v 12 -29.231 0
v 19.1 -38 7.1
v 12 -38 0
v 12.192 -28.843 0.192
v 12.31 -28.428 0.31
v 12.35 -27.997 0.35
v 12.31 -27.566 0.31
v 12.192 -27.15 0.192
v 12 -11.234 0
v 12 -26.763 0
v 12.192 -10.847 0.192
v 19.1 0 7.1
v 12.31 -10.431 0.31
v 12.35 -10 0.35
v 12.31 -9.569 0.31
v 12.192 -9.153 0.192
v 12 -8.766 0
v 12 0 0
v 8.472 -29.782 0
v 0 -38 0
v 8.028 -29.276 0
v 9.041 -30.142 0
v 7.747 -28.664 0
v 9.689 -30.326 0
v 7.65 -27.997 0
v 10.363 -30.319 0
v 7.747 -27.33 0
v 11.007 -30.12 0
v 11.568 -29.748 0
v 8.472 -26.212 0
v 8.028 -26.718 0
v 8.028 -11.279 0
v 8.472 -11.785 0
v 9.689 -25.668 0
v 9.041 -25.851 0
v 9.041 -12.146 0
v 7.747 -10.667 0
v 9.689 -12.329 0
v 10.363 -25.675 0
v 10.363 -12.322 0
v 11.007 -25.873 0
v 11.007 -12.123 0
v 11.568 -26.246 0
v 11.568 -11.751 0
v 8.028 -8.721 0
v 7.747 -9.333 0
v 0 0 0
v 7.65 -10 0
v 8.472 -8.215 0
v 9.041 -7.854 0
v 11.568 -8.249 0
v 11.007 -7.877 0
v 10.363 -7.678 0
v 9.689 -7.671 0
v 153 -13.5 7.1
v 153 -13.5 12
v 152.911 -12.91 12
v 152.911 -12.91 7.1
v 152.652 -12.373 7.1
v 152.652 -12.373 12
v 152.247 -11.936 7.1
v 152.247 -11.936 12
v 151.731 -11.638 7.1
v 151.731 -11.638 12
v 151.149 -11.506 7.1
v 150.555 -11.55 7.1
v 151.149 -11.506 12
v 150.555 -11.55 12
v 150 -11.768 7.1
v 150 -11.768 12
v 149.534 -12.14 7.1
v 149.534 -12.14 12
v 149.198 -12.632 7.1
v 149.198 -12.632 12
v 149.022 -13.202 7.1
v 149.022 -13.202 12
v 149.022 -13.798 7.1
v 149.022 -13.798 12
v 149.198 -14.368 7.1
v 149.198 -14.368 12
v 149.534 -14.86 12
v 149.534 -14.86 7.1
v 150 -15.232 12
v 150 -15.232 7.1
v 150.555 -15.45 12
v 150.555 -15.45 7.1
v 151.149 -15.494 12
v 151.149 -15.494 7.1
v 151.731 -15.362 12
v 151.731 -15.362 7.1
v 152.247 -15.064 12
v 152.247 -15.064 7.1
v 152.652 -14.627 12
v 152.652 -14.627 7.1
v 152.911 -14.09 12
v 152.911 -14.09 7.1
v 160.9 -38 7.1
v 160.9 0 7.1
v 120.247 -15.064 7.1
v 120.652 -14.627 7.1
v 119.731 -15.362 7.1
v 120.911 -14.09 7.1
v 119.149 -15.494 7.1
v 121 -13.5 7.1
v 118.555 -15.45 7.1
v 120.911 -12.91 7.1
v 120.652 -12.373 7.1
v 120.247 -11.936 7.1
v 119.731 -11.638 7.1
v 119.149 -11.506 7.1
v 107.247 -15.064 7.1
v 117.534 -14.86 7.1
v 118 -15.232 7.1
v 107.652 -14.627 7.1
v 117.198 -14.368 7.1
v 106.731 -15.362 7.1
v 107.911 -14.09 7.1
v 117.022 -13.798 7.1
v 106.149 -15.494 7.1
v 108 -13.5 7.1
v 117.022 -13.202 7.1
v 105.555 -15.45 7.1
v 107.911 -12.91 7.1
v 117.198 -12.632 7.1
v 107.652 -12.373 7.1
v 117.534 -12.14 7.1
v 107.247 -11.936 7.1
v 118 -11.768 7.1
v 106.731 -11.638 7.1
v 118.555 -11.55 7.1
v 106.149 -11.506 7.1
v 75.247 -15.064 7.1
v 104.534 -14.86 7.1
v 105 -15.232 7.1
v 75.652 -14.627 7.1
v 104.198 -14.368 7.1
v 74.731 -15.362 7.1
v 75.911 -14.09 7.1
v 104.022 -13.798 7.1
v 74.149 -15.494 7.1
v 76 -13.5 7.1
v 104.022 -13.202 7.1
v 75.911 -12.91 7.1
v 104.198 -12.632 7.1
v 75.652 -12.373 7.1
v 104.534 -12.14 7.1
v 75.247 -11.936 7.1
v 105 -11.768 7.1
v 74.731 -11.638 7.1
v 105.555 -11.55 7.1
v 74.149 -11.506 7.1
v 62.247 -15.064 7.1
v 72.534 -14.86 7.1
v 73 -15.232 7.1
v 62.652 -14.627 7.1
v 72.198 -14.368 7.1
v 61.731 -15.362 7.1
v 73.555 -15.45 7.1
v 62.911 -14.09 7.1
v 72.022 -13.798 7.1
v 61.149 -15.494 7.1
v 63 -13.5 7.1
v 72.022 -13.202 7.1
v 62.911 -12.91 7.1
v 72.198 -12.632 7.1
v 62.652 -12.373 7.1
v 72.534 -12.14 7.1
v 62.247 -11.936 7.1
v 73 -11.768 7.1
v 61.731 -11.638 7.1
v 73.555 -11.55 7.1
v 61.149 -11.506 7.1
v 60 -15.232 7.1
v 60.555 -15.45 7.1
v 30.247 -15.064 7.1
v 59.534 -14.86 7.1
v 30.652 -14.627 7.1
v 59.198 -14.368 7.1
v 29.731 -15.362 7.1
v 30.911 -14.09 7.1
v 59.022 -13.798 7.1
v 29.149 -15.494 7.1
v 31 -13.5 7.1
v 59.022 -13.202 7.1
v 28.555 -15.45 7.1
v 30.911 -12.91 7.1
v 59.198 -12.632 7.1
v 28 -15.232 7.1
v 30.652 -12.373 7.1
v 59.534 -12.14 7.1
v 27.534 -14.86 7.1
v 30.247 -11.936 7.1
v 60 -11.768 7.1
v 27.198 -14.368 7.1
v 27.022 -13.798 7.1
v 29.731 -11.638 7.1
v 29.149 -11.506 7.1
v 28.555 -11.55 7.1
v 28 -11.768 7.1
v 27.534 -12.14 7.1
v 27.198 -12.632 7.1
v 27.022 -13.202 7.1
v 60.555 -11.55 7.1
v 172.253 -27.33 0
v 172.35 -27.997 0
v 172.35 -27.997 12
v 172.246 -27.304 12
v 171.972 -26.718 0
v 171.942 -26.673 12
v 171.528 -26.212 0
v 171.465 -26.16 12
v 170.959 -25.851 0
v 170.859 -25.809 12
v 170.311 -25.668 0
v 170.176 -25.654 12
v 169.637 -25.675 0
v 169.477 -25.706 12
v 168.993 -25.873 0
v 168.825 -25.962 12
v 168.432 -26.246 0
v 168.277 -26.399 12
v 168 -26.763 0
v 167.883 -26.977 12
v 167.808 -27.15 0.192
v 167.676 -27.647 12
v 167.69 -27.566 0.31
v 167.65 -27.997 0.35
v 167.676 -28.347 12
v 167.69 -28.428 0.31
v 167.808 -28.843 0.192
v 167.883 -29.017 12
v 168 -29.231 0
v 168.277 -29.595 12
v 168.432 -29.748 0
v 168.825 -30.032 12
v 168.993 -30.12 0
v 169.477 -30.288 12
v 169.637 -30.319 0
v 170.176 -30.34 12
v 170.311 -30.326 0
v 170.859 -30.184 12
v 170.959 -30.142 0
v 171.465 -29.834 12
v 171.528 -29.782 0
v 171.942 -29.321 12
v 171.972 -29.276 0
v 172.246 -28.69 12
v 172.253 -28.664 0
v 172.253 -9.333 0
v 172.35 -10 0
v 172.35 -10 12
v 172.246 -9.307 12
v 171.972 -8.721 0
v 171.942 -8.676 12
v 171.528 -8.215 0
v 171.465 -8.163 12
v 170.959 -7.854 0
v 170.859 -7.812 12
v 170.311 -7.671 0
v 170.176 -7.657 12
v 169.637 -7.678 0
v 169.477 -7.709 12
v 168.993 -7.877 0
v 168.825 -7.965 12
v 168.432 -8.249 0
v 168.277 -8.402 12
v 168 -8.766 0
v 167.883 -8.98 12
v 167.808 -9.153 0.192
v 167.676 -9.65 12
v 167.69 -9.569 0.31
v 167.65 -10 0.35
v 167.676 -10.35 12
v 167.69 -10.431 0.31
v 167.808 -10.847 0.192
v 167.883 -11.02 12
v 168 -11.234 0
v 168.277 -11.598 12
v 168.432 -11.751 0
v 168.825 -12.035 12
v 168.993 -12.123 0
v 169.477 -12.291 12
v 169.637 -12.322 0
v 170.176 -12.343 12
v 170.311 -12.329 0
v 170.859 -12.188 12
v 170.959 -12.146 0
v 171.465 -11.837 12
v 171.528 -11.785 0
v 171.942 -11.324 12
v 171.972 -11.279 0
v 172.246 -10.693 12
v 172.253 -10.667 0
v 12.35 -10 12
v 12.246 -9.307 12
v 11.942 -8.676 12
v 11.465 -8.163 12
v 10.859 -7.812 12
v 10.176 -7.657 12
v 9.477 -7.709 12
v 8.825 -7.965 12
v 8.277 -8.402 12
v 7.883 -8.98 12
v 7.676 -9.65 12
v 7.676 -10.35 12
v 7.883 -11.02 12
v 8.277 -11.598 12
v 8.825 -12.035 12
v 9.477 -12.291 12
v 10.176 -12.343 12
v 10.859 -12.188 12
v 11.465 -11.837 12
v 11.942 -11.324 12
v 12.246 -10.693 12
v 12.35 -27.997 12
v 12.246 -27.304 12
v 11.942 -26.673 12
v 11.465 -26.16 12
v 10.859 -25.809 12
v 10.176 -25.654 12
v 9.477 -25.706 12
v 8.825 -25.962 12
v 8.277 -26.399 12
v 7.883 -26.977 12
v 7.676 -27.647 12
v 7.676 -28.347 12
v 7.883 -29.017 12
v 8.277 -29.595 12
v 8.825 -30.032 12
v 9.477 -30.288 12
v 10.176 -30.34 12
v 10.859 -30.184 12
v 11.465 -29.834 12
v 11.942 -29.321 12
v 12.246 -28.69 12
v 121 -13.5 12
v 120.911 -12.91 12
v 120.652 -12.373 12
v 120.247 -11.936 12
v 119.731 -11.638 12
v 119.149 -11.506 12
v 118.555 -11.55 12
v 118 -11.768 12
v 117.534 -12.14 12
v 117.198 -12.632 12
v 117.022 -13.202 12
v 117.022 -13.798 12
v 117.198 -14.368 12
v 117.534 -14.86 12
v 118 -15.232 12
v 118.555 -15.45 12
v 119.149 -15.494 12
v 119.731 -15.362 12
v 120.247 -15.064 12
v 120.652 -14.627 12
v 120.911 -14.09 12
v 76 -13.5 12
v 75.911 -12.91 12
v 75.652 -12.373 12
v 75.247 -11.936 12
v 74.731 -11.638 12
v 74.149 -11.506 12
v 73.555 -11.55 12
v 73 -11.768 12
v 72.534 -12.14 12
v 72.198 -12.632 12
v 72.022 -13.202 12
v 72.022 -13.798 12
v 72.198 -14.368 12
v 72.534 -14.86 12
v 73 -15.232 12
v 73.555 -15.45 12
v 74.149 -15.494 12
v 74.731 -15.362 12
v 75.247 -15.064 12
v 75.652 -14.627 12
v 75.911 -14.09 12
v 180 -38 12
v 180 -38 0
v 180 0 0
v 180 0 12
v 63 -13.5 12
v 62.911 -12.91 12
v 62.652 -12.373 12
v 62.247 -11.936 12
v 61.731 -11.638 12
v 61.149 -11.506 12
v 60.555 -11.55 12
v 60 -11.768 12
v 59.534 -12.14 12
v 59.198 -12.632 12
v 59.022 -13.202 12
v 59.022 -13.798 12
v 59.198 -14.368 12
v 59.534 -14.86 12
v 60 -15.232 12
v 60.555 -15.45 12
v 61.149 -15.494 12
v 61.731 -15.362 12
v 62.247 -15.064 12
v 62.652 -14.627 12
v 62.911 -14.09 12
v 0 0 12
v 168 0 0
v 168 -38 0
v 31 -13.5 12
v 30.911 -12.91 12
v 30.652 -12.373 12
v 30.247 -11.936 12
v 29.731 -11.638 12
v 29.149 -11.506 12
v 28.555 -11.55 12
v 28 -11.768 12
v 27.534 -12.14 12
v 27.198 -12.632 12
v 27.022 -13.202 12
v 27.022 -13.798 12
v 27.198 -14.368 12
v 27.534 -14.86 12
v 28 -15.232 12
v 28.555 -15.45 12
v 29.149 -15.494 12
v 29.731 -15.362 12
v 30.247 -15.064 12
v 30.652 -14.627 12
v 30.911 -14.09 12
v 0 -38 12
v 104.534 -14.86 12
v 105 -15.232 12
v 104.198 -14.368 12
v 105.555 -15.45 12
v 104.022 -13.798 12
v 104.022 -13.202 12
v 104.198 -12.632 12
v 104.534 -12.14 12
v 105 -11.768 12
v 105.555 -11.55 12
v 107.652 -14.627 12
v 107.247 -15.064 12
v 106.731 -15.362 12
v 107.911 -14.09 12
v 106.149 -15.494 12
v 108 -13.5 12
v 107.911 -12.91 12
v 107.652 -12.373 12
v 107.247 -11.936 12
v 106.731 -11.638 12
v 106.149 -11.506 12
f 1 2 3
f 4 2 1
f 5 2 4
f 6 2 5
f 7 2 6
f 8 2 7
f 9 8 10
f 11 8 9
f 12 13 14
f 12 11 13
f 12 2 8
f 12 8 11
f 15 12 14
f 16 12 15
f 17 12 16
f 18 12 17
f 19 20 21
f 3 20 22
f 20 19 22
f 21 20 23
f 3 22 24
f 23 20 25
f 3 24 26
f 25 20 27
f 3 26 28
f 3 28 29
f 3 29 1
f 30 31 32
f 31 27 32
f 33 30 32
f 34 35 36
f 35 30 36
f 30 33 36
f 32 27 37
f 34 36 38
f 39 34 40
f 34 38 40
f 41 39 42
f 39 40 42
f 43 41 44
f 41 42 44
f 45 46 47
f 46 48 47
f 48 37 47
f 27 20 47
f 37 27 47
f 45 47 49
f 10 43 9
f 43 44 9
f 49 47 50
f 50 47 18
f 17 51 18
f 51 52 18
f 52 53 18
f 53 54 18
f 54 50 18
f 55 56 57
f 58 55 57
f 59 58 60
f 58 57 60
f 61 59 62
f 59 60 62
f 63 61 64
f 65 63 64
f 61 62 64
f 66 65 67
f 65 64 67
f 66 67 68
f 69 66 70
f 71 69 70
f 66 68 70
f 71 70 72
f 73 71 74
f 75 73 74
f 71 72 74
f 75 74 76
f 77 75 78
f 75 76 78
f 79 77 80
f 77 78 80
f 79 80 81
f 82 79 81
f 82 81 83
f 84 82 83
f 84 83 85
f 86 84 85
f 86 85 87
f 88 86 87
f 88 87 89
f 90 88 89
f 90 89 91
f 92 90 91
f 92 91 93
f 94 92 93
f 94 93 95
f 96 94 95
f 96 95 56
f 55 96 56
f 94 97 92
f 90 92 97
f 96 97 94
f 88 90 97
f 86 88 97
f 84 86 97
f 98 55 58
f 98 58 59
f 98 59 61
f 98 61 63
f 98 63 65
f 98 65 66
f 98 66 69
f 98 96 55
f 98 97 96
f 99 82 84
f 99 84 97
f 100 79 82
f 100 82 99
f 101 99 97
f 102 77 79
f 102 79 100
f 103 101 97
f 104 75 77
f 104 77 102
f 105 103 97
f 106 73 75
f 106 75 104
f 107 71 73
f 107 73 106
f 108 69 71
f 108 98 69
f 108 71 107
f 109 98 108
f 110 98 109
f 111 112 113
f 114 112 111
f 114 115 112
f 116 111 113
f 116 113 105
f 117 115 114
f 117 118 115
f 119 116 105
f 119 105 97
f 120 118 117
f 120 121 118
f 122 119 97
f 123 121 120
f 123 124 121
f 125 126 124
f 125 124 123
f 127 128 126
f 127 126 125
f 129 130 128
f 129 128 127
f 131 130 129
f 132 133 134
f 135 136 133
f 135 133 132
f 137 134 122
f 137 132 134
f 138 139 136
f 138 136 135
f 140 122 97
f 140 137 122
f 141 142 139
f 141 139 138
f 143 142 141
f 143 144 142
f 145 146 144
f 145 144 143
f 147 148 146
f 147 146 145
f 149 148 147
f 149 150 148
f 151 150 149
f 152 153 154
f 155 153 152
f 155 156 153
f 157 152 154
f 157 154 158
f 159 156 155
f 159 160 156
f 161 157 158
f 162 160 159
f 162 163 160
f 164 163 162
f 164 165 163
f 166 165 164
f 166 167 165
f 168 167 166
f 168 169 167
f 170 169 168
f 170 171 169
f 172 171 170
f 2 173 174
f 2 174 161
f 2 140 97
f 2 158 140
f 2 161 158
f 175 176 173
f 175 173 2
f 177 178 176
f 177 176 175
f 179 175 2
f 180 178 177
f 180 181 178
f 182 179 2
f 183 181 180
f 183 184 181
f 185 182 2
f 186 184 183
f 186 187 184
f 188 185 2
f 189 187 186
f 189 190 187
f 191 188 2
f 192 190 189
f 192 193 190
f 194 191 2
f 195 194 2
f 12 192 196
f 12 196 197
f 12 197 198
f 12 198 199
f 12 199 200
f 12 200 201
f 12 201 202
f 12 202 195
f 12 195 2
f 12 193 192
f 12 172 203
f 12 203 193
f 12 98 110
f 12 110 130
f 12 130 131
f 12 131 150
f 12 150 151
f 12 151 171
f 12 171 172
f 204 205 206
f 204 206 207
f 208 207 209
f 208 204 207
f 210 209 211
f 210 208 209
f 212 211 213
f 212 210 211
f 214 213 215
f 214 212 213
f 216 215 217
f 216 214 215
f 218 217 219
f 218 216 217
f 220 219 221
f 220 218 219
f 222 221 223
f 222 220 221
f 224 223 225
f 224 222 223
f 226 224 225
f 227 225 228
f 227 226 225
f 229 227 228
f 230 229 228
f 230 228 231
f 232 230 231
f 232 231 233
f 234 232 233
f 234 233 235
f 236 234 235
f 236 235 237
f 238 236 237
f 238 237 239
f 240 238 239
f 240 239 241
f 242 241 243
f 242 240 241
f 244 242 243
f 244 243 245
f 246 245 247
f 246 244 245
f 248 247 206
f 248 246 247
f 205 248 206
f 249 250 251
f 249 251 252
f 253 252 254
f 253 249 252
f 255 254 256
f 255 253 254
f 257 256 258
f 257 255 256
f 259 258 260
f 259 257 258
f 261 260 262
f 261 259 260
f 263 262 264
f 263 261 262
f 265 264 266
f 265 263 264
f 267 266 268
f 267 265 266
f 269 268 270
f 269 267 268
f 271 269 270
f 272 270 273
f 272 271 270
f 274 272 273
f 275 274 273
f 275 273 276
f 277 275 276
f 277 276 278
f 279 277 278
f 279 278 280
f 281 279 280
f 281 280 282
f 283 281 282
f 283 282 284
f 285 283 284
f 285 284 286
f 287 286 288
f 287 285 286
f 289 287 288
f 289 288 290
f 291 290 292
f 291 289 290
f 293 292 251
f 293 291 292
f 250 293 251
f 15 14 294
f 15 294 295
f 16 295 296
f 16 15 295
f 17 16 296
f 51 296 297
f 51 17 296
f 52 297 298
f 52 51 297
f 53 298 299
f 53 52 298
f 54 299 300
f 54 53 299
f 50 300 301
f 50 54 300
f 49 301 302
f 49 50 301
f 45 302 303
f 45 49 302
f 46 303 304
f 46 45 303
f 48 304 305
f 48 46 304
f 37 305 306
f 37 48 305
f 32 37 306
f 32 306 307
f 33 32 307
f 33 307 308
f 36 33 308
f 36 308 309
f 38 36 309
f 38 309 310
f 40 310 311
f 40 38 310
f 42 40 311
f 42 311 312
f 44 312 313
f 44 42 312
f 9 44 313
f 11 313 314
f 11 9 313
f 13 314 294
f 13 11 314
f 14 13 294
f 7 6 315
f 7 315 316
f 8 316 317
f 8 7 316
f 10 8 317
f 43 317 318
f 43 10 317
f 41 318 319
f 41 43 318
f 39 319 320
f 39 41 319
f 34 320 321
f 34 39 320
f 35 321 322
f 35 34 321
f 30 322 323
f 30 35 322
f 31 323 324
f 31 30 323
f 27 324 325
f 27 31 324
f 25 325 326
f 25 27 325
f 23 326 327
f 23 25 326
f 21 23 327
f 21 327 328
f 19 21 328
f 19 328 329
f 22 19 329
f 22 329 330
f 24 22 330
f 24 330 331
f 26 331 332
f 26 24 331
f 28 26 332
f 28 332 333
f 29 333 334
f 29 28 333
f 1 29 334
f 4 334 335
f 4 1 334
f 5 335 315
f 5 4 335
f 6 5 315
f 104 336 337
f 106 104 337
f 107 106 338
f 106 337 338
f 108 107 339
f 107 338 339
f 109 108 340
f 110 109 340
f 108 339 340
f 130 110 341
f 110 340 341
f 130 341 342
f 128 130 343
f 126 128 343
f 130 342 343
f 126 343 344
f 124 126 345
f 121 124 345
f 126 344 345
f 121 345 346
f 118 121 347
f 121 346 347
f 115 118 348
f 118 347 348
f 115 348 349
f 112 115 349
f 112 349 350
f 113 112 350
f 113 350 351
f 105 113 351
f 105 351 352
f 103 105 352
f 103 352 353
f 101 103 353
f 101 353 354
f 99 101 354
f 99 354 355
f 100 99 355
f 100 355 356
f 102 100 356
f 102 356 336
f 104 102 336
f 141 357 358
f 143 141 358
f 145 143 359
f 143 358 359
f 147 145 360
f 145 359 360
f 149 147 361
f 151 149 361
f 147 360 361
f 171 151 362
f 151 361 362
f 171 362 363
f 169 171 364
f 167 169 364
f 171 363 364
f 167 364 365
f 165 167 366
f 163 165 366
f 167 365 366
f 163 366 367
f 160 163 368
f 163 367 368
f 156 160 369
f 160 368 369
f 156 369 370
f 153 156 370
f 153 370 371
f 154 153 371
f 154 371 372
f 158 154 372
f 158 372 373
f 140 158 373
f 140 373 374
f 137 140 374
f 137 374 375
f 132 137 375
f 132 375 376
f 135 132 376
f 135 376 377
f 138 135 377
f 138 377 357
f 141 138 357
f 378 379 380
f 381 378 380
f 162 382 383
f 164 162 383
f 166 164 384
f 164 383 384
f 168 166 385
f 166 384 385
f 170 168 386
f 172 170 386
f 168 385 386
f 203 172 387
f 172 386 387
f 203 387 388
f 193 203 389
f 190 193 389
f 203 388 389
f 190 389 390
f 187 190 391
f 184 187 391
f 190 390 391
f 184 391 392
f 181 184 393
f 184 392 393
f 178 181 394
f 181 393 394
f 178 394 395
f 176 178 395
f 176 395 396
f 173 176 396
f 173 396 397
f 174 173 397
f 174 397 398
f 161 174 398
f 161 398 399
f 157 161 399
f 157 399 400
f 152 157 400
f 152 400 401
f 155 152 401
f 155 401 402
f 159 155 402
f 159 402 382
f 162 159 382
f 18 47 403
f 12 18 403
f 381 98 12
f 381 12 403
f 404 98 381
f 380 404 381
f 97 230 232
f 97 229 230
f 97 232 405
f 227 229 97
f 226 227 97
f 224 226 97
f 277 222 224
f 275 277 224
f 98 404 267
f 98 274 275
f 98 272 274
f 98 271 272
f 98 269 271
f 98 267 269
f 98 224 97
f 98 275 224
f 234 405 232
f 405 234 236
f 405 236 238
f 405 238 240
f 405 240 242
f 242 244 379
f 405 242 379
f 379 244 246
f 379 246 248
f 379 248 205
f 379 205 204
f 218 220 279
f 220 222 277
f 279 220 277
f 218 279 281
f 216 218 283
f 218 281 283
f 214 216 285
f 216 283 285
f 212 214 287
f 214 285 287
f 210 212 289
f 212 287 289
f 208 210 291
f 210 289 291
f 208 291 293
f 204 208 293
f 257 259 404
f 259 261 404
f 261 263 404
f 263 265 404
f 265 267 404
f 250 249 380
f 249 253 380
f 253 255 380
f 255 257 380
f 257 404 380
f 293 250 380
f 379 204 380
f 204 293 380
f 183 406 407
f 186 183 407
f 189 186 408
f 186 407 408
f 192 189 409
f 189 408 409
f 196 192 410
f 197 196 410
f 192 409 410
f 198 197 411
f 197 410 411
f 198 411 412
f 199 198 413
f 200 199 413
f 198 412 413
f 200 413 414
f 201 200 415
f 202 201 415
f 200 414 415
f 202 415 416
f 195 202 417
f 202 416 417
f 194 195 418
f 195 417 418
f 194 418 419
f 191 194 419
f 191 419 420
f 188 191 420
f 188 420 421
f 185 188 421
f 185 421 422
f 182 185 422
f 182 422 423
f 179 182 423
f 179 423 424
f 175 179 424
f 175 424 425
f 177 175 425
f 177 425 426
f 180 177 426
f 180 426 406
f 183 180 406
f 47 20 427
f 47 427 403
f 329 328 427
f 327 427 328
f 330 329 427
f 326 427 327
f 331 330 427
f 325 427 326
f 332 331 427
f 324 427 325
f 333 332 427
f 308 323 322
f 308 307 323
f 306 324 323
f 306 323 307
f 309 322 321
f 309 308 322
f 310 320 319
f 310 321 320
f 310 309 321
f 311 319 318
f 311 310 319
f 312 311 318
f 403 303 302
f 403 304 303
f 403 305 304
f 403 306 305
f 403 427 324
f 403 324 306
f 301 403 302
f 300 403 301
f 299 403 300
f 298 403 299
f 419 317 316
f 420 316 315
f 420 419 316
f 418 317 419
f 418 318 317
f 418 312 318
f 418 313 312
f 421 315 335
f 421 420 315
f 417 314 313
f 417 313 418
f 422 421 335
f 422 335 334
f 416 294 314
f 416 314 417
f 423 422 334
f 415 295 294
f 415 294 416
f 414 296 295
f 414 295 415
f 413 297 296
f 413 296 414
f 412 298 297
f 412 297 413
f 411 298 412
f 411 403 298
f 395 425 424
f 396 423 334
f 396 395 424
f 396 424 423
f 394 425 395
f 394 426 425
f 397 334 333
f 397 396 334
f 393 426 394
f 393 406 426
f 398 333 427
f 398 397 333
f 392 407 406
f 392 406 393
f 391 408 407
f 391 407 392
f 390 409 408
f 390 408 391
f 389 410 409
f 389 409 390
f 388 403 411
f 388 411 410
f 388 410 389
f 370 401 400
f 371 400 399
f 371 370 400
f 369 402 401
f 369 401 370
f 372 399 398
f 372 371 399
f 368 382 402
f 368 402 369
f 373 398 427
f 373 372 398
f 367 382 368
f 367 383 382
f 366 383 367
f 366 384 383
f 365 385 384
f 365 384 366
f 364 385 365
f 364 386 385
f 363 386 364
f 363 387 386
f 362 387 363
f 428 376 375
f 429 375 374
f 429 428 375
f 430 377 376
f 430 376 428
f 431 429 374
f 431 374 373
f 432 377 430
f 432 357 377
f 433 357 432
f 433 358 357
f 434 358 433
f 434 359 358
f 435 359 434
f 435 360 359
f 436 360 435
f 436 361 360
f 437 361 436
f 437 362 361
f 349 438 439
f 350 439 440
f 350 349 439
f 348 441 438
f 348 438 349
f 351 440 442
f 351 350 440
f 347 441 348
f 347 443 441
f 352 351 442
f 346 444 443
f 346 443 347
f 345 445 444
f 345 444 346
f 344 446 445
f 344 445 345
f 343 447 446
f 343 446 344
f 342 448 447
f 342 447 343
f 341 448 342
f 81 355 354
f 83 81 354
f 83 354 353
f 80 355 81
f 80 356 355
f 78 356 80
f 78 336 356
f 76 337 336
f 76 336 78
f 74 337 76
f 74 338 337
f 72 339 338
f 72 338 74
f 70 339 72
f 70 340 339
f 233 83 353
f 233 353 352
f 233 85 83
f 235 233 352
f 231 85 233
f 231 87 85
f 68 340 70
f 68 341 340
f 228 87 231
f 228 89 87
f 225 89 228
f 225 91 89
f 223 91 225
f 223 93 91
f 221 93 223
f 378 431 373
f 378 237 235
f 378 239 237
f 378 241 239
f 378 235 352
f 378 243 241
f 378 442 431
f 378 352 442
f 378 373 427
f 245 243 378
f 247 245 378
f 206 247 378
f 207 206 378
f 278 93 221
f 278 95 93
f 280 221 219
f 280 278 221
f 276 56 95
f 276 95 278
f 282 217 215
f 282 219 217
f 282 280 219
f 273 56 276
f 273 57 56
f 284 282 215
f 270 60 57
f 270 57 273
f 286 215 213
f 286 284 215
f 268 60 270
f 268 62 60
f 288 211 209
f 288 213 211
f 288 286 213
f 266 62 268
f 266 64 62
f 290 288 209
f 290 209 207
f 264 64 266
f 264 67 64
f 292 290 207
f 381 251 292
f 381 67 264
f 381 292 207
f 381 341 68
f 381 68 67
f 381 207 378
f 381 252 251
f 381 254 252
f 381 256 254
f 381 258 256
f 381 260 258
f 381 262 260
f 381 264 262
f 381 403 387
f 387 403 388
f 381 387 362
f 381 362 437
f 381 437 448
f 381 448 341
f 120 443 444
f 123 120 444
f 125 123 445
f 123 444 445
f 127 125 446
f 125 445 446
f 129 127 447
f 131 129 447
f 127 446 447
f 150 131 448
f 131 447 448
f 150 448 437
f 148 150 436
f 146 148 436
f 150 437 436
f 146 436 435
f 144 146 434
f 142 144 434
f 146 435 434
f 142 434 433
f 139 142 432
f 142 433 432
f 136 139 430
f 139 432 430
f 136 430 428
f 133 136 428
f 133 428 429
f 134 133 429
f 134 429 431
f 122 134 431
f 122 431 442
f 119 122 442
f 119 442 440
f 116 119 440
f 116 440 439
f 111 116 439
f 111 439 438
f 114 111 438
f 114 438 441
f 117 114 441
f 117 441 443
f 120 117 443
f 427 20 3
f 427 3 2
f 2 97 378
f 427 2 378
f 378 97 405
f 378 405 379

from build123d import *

# Parameters (mm, degrees)
SKETCH1_W           = 180
SKETCH1_H           = 38
SKETCH1_R           = 2.35
BOSS_EXTRUDE1_DEPTH = 12
CUT_EXTRUDE1_DEPTH  = 38
SKETCH3_R           = 2
CUT_EXTRUDE2_DEPTH  = 22


with BuildPart() as part:
    # Sketch1 → Boss-Extrude1 (new body)
    with BuildSketch(Plane.XY):
        with Locations((90, -19)):
            Rectangle(SKETCH1_W, SKETCH1_H)
        with Locations((170, -10)):
            Circle(SKETCH1_R, mode=Mode.SUBTRACT)
        with Locations((170, -27.996930787)):
            Circle(SKETCH1_R, mode=Mode.SUBTRACT)
        with Locations((10, -10)):
            Circle(SKETCH1_R, mode=Mode.SUBTRACT)
        with Locations((10, -27.996930787)):
            Circle(SKETCH1_R, mode=Mode.SUBTRACT)
    extrude(amount=BOSS_EXTRUDE1_DEPTH)

    # Sketch2 → Cut-Extrude1 (cut)
    with BuildSketch(Plane(origin=(0, 0, 0), x_dir=(1, 0, 0), z_dir=(0, 1, 0))):
        Polygon((168, 0), (160.9, -7.1), (19.1, -7.1), (12, 0), align=None)
    extrude(amount=-CUT_EXTRUDE1_DEPTH, mode=Mode.SUBTRACT)

    # Sketch3 → Cut-Extrude2 (cut)
    with BuildSketch(Plane.XY.offset(12)):
        with Locations((151, -13.5)):
            Circle(SKETCH3_R)
        with Locations((119, -13.5)):
            Circle(SKETCH3_R)
        with Locations((106, -13.5)):
            Circle(SKETCH3_R)
        with Locations((74, -13.5)):
            Circle(SKETCH3_R)
        with Locations((61, -13.5)):
            Circle(SKETCH3_R)
        with Locations((29, -13.5)):
            Circle(SKETCH3_R)
    extrude(amount=-CUT_EXTRUDE2_DEPTH, mode=Mode.SUBTRACT)


solid = part.part
